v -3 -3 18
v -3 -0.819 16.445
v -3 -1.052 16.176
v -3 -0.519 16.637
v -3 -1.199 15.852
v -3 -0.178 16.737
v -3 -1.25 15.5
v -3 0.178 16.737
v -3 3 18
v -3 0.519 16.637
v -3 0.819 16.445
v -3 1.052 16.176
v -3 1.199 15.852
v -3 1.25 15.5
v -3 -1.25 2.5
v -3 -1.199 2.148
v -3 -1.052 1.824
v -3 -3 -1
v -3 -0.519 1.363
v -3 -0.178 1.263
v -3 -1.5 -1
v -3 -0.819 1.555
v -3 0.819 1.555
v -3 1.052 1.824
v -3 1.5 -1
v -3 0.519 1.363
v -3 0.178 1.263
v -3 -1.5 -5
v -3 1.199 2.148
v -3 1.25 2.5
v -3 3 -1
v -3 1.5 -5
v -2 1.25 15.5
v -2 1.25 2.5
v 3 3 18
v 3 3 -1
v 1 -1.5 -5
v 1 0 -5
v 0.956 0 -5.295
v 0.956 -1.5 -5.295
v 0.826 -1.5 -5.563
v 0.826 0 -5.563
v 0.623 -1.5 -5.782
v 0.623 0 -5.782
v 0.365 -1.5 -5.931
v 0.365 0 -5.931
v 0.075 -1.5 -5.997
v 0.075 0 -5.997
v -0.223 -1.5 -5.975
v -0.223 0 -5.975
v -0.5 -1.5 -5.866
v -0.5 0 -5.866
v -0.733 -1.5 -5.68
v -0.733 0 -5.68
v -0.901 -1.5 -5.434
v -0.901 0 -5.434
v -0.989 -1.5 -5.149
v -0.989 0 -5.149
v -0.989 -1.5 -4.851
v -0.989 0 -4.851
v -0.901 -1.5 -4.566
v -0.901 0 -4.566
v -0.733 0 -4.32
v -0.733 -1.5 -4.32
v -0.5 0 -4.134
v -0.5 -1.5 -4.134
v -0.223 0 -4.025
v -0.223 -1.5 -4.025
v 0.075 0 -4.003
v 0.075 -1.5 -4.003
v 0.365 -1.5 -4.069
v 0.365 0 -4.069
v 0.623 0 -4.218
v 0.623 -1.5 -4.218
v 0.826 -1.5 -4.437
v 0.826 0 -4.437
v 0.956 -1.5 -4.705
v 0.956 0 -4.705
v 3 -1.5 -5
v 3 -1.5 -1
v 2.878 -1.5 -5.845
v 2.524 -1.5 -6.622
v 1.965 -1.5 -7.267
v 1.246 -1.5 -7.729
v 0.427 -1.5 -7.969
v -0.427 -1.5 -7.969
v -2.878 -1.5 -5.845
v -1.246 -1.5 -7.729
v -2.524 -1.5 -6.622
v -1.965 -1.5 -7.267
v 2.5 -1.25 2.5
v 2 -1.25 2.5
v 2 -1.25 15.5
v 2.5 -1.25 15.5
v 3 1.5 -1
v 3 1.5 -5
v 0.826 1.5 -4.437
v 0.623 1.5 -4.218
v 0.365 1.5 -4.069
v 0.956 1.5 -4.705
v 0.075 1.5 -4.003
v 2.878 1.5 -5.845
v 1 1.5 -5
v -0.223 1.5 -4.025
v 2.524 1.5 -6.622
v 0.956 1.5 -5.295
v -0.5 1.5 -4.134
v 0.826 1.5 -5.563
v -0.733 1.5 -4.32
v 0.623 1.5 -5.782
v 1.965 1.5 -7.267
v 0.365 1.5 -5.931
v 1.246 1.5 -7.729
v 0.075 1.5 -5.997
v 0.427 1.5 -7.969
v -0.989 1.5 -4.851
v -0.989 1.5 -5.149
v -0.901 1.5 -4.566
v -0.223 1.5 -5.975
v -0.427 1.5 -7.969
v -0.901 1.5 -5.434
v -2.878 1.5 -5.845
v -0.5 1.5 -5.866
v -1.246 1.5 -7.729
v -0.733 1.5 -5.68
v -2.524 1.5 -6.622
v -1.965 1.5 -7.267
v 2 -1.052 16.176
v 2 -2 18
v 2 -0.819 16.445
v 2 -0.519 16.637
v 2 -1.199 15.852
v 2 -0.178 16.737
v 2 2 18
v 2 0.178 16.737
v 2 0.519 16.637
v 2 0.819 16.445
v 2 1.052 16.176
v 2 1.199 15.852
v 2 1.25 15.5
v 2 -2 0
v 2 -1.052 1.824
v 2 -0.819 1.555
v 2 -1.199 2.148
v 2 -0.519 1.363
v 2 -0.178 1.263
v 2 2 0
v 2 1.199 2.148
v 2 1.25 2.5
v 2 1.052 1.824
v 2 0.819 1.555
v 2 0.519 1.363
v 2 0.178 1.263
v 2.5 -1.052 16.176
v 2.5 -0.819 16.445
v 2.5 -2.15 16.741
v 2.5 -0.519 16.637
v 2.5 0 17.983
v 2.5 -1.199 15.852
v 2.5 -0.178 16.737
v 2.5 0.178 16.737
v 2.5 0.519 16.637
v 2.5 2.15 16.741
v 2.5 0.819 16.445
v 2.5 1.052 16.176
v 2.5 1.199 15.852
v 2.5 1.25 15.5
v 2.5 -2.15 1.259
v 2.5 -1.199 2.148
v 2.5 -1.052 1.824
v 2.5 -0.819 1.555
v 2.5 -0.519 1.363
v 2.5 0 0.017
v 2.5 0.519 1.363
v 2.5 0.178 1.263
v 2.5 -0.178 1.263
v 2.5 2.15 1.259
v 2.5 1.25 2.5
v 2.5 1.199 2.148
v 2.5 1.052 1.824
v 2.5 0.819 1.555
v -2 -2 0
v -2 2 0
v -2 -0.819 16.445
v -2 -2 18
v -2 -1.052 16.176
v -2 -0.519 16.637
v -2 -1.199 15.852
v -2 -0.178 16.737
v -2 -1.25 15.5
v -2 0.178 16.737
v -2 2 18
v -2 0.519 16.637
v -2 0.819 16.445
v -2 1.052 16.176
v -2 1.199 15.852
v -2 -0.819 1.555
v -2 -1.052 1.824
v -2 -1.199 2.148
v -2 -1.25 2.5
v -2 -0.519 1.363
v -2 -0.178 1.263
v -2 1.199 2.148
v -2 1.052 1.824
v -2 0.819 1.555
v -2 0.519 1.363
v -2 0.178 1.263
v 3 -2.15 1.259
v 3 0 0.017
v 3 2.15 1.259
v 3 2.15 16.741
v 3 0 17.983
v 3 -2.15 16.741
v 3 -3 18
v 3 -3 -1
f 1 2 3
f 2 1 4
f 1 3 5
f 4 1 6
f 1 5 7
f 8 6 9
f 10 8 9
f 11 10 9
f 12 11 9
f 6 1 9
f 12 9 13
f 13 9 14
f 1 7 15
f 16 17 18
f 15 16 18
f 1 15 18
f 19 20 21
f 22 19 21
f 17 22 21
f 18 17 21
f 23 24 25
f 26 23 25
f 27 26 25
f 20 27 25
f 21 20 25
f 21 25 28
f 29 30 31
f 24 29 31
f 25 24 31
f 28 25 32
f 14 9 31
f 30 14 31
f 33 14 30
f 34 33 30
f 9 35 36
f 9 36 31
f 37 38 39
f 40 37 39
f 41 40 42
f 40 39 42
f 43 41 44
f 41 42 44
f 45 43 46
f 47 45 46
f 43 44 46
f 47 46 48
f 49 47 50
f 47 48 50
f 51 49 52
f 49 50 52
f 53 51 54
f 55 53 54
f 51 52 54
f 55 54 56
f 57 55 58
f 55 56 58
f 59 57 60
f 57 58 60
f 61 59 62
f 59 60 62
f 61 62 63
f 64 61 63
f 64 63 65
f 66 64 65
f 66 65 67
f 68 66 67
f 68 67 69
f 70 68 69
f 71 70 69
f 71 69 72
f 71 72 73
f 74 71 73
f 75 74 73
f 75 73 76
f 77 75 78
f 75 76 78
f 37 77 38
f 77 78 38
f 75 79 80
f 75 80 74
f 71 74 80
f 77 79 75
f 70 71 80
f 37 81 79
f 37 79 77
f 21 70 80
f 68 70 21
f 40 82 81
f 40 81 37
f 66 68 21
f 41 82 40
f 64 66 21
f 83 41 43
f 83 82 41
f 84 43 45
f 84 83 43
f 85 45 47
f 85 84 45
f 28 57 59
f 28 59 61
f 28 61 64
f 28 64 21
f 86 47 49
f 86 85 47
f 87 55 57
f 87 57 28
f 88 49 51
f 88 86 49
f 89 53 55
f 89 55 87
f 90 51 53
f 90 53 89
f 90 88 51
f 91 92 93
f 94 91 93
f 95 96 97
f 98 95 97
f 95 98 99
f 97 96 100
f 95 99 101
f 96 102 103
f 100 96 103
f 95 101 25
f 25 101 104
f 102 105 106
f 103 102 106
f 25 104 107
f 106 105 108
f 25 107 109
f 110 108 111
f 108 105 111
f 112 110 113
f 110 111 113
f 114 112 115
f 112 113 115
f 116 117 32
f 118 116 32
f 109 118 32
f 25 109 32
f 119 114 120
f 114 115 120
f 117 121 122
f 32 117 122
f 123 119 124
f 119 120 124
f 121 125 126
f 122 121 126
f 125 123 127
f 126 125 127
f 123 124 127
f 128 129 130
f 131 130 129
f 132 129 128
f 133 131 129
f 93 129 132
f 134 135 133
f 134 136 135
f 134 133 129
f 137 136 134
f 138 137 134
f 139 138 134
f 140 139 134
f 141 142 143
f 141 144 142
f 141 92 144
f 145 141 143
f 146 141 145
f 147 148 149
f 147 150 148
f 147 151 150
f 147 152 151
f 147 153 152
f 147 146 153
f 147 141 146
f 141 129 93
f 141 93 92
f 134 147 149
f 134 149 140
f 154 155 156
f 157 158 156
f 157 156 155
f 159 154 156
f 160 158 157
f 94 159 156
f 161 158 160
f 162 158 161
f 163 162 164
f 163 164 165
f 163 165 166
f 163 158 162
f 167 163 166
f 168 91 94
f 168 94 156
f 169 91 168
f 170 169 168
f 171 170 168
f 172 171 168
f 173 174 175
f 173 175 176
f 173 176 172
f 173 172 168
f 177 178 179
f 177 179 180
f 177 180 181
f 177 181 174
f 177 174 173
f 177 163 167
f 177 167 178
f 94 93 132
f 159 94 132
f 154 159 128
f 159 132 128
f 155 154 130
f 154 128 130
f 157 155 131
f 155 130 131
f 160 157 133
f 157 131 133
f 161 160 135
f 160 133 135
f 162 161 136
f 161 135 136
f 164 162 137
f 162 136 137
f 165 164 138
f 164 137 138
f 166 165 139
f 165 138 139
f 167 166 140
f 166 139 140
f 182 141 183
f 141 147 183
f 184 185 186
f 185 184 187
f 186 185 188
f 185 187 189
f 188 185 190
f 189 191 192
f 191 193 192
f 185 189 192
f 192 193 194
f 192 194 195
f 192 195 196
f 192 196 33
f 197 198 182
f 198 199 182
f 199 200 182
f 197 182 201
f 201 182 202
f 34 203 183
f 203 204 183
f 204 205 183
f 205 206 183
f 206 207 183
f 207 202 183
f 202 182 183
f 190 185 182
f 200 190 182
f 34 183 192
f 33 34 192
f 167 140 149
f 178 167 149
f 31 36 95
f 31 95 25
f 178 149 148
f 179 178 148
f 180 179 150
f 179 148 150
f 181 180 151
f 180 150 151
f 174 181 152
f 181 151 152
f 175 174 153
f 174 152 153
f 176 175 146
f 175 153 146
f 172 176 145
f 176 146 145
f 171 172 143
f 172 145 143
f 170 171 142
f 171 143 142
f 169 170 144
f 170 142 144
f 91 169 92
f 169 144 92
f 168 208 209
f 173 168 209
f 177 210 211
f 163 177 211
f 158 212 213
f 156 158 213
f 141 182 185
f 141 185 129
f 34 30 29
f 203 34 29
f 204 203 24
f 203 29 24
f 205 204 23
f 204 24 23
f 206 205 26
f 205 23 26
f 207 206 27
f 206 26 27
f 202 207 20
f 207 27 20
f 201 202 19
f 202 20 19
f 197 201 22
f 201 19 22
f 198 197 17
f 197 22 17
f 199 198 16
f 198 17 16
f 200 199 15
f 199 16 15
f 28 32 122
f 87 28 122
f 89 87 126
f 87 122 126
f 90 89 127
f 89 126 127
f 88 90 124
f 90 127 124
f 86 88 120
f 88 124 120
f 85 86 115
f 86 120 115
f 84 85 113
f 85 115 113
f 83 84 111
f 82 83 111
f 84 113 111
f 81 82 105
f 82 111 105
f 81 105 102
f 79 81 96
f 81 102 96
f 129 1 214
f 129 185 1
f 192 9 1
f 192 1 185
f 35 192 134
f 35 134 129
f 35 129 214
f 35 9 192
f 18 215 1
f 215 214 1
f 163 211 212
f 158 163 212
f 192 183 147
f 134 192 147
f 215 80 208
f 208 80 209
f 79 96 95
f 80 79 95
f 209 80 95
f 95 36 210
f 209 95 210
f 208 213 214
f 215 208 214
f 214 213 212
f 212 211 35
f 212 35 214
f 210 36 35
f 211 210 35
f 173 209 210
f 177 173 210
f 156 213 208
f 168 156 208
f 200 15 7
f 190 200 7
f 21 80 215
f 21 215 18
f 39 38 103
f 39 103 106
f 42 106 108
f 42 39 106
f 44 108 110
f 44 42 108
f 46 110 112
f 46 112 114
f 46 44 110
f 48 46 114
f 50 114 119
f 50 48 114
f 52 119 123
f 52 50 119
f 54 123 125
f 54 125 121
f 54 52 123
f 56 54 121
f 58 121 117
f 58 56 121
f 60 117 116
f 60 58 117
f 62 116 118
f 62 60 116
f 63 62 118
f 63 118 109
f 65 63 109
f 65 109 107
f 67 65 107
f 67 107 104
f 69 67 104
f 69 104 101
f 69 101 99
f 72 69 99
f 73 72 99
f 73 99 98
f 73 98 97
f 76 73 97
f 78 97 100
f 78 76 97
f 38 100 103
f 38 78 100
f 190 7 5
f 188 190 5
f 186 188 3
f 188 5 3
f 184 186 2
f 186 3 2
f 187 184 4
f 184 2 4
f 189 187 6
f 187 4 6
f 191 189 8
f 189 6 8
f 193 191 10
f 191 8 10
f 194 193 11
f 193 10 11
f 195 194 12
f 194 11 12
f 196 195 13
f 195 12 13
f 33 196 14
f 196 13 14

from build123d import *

# Parameters (mm, degrees)
SKETCH_1_W           = 6
SKETCH_1_H           = 6
SKETCH_1_W_2         = 4
SKETCH_1_H_2         = 4
EXTRUDE_1_DEPTH      = 18
SKETCH_2_W           = 6
SKETCH_2_H           = 6
EXTRUDE_2_DEPTH      = 1
SKETCH_3_R           = 1
EXTRUDE_3_DEPTH      = 1.5
EXTRUDE_3_DEPTH_BACK = 1.5
CUT_EXTRUDE_1_DEPTH  = 6
CUT_EXTRUDE_2_DEPTH  = 0.5


with BuildPart() as part:
    # 스케치1 → 보스-돌출1 (new body)
    with BuildSketch(Plane.XY):
        Rectangle(SKETCH_1_W, SKETCH_1_H)
        Rectangle(SKETCH_1_W_2, SKETCH_1_H_2, mode=Mode.SUBTRACT)
    extrude(amount=EXTRUDE_1_DEPTH)

    # 스케치2 → 보스-돌출2 (add)
    with BuildSketch(Plane(origin=(0, 0, 0), x_dir=(-1, 0, 0), z_dir=(0, 0, -1))):
        Rectangle(SKETCH_2_W, SKETCH_2_H)
    extrude(amount=EXTRUDE_2_DEPTH)

    # 스케치3 → 보스-돌출3 (add, two sides)
    with BuildSketch(Plane(origin=(0, 0, 0), x_dir=(1, 0, 0), z_dir=(0, 1, 0))) as extrude_3_sk:
        with BuildLine():
            Line((3, 5), (3, 1))
            Line((3, 1), (-3, 1))
            Line((-3, 1), (-3, 5))
            ThreePointArc((-3, 5), (0, 8), (3, 5))
        make_face()
        with Locations((0, 5)):
            Circle(SKETCH_3_R, mode=Mode.SUBTRACT)
    extrude(amount=EXTRUDE_3_DEPTH)
    extrude(extrude_3_sk.sketch, amount=-EXTRUDE_3_DEPTH_BACK)

    # 스케치4 → 컷-돌출1 (cut)
    with BuildSketch(Plane.ZY.offset(3)):
        with BuildLine():
            Line((15.5, 1.25), (2.5, 1.25))
            ThreePointArc((2.5, 1.25), (1.25, 0), (2.5, -1.25))
            Line((2.5, -1.25), (15.5, -1.25))
            ThreePointArc((15.5, -1.25), (16.75, 0), (15.5, 1.25))
        make_face()
    extrude(amount=-CUT_EXTRUDE_1_DEPTH, mode=Mode.SUBTRACT)

    # 스케치5 → 컷-돌출2 (cut)
    with BuildSketch(Plane(origin=(3, 0, 0), x_dir=(0, 0, -1), z_dir=(1, 0, 0))):
        Polygon((-9, 2.15), (-16.741303079, 2.15), (-17.982606158, 0), (-16.741303079, -2.15), (-9, -2.15), (-1.258696921, -2.15), (-0.017393842, 0), (-1.258696921, 2.15), align=None)
    extrude(amount=-CUT_EXTRUDE_2_DEPTH, mode=Mode.SUBTRACT)


solid = part.part
